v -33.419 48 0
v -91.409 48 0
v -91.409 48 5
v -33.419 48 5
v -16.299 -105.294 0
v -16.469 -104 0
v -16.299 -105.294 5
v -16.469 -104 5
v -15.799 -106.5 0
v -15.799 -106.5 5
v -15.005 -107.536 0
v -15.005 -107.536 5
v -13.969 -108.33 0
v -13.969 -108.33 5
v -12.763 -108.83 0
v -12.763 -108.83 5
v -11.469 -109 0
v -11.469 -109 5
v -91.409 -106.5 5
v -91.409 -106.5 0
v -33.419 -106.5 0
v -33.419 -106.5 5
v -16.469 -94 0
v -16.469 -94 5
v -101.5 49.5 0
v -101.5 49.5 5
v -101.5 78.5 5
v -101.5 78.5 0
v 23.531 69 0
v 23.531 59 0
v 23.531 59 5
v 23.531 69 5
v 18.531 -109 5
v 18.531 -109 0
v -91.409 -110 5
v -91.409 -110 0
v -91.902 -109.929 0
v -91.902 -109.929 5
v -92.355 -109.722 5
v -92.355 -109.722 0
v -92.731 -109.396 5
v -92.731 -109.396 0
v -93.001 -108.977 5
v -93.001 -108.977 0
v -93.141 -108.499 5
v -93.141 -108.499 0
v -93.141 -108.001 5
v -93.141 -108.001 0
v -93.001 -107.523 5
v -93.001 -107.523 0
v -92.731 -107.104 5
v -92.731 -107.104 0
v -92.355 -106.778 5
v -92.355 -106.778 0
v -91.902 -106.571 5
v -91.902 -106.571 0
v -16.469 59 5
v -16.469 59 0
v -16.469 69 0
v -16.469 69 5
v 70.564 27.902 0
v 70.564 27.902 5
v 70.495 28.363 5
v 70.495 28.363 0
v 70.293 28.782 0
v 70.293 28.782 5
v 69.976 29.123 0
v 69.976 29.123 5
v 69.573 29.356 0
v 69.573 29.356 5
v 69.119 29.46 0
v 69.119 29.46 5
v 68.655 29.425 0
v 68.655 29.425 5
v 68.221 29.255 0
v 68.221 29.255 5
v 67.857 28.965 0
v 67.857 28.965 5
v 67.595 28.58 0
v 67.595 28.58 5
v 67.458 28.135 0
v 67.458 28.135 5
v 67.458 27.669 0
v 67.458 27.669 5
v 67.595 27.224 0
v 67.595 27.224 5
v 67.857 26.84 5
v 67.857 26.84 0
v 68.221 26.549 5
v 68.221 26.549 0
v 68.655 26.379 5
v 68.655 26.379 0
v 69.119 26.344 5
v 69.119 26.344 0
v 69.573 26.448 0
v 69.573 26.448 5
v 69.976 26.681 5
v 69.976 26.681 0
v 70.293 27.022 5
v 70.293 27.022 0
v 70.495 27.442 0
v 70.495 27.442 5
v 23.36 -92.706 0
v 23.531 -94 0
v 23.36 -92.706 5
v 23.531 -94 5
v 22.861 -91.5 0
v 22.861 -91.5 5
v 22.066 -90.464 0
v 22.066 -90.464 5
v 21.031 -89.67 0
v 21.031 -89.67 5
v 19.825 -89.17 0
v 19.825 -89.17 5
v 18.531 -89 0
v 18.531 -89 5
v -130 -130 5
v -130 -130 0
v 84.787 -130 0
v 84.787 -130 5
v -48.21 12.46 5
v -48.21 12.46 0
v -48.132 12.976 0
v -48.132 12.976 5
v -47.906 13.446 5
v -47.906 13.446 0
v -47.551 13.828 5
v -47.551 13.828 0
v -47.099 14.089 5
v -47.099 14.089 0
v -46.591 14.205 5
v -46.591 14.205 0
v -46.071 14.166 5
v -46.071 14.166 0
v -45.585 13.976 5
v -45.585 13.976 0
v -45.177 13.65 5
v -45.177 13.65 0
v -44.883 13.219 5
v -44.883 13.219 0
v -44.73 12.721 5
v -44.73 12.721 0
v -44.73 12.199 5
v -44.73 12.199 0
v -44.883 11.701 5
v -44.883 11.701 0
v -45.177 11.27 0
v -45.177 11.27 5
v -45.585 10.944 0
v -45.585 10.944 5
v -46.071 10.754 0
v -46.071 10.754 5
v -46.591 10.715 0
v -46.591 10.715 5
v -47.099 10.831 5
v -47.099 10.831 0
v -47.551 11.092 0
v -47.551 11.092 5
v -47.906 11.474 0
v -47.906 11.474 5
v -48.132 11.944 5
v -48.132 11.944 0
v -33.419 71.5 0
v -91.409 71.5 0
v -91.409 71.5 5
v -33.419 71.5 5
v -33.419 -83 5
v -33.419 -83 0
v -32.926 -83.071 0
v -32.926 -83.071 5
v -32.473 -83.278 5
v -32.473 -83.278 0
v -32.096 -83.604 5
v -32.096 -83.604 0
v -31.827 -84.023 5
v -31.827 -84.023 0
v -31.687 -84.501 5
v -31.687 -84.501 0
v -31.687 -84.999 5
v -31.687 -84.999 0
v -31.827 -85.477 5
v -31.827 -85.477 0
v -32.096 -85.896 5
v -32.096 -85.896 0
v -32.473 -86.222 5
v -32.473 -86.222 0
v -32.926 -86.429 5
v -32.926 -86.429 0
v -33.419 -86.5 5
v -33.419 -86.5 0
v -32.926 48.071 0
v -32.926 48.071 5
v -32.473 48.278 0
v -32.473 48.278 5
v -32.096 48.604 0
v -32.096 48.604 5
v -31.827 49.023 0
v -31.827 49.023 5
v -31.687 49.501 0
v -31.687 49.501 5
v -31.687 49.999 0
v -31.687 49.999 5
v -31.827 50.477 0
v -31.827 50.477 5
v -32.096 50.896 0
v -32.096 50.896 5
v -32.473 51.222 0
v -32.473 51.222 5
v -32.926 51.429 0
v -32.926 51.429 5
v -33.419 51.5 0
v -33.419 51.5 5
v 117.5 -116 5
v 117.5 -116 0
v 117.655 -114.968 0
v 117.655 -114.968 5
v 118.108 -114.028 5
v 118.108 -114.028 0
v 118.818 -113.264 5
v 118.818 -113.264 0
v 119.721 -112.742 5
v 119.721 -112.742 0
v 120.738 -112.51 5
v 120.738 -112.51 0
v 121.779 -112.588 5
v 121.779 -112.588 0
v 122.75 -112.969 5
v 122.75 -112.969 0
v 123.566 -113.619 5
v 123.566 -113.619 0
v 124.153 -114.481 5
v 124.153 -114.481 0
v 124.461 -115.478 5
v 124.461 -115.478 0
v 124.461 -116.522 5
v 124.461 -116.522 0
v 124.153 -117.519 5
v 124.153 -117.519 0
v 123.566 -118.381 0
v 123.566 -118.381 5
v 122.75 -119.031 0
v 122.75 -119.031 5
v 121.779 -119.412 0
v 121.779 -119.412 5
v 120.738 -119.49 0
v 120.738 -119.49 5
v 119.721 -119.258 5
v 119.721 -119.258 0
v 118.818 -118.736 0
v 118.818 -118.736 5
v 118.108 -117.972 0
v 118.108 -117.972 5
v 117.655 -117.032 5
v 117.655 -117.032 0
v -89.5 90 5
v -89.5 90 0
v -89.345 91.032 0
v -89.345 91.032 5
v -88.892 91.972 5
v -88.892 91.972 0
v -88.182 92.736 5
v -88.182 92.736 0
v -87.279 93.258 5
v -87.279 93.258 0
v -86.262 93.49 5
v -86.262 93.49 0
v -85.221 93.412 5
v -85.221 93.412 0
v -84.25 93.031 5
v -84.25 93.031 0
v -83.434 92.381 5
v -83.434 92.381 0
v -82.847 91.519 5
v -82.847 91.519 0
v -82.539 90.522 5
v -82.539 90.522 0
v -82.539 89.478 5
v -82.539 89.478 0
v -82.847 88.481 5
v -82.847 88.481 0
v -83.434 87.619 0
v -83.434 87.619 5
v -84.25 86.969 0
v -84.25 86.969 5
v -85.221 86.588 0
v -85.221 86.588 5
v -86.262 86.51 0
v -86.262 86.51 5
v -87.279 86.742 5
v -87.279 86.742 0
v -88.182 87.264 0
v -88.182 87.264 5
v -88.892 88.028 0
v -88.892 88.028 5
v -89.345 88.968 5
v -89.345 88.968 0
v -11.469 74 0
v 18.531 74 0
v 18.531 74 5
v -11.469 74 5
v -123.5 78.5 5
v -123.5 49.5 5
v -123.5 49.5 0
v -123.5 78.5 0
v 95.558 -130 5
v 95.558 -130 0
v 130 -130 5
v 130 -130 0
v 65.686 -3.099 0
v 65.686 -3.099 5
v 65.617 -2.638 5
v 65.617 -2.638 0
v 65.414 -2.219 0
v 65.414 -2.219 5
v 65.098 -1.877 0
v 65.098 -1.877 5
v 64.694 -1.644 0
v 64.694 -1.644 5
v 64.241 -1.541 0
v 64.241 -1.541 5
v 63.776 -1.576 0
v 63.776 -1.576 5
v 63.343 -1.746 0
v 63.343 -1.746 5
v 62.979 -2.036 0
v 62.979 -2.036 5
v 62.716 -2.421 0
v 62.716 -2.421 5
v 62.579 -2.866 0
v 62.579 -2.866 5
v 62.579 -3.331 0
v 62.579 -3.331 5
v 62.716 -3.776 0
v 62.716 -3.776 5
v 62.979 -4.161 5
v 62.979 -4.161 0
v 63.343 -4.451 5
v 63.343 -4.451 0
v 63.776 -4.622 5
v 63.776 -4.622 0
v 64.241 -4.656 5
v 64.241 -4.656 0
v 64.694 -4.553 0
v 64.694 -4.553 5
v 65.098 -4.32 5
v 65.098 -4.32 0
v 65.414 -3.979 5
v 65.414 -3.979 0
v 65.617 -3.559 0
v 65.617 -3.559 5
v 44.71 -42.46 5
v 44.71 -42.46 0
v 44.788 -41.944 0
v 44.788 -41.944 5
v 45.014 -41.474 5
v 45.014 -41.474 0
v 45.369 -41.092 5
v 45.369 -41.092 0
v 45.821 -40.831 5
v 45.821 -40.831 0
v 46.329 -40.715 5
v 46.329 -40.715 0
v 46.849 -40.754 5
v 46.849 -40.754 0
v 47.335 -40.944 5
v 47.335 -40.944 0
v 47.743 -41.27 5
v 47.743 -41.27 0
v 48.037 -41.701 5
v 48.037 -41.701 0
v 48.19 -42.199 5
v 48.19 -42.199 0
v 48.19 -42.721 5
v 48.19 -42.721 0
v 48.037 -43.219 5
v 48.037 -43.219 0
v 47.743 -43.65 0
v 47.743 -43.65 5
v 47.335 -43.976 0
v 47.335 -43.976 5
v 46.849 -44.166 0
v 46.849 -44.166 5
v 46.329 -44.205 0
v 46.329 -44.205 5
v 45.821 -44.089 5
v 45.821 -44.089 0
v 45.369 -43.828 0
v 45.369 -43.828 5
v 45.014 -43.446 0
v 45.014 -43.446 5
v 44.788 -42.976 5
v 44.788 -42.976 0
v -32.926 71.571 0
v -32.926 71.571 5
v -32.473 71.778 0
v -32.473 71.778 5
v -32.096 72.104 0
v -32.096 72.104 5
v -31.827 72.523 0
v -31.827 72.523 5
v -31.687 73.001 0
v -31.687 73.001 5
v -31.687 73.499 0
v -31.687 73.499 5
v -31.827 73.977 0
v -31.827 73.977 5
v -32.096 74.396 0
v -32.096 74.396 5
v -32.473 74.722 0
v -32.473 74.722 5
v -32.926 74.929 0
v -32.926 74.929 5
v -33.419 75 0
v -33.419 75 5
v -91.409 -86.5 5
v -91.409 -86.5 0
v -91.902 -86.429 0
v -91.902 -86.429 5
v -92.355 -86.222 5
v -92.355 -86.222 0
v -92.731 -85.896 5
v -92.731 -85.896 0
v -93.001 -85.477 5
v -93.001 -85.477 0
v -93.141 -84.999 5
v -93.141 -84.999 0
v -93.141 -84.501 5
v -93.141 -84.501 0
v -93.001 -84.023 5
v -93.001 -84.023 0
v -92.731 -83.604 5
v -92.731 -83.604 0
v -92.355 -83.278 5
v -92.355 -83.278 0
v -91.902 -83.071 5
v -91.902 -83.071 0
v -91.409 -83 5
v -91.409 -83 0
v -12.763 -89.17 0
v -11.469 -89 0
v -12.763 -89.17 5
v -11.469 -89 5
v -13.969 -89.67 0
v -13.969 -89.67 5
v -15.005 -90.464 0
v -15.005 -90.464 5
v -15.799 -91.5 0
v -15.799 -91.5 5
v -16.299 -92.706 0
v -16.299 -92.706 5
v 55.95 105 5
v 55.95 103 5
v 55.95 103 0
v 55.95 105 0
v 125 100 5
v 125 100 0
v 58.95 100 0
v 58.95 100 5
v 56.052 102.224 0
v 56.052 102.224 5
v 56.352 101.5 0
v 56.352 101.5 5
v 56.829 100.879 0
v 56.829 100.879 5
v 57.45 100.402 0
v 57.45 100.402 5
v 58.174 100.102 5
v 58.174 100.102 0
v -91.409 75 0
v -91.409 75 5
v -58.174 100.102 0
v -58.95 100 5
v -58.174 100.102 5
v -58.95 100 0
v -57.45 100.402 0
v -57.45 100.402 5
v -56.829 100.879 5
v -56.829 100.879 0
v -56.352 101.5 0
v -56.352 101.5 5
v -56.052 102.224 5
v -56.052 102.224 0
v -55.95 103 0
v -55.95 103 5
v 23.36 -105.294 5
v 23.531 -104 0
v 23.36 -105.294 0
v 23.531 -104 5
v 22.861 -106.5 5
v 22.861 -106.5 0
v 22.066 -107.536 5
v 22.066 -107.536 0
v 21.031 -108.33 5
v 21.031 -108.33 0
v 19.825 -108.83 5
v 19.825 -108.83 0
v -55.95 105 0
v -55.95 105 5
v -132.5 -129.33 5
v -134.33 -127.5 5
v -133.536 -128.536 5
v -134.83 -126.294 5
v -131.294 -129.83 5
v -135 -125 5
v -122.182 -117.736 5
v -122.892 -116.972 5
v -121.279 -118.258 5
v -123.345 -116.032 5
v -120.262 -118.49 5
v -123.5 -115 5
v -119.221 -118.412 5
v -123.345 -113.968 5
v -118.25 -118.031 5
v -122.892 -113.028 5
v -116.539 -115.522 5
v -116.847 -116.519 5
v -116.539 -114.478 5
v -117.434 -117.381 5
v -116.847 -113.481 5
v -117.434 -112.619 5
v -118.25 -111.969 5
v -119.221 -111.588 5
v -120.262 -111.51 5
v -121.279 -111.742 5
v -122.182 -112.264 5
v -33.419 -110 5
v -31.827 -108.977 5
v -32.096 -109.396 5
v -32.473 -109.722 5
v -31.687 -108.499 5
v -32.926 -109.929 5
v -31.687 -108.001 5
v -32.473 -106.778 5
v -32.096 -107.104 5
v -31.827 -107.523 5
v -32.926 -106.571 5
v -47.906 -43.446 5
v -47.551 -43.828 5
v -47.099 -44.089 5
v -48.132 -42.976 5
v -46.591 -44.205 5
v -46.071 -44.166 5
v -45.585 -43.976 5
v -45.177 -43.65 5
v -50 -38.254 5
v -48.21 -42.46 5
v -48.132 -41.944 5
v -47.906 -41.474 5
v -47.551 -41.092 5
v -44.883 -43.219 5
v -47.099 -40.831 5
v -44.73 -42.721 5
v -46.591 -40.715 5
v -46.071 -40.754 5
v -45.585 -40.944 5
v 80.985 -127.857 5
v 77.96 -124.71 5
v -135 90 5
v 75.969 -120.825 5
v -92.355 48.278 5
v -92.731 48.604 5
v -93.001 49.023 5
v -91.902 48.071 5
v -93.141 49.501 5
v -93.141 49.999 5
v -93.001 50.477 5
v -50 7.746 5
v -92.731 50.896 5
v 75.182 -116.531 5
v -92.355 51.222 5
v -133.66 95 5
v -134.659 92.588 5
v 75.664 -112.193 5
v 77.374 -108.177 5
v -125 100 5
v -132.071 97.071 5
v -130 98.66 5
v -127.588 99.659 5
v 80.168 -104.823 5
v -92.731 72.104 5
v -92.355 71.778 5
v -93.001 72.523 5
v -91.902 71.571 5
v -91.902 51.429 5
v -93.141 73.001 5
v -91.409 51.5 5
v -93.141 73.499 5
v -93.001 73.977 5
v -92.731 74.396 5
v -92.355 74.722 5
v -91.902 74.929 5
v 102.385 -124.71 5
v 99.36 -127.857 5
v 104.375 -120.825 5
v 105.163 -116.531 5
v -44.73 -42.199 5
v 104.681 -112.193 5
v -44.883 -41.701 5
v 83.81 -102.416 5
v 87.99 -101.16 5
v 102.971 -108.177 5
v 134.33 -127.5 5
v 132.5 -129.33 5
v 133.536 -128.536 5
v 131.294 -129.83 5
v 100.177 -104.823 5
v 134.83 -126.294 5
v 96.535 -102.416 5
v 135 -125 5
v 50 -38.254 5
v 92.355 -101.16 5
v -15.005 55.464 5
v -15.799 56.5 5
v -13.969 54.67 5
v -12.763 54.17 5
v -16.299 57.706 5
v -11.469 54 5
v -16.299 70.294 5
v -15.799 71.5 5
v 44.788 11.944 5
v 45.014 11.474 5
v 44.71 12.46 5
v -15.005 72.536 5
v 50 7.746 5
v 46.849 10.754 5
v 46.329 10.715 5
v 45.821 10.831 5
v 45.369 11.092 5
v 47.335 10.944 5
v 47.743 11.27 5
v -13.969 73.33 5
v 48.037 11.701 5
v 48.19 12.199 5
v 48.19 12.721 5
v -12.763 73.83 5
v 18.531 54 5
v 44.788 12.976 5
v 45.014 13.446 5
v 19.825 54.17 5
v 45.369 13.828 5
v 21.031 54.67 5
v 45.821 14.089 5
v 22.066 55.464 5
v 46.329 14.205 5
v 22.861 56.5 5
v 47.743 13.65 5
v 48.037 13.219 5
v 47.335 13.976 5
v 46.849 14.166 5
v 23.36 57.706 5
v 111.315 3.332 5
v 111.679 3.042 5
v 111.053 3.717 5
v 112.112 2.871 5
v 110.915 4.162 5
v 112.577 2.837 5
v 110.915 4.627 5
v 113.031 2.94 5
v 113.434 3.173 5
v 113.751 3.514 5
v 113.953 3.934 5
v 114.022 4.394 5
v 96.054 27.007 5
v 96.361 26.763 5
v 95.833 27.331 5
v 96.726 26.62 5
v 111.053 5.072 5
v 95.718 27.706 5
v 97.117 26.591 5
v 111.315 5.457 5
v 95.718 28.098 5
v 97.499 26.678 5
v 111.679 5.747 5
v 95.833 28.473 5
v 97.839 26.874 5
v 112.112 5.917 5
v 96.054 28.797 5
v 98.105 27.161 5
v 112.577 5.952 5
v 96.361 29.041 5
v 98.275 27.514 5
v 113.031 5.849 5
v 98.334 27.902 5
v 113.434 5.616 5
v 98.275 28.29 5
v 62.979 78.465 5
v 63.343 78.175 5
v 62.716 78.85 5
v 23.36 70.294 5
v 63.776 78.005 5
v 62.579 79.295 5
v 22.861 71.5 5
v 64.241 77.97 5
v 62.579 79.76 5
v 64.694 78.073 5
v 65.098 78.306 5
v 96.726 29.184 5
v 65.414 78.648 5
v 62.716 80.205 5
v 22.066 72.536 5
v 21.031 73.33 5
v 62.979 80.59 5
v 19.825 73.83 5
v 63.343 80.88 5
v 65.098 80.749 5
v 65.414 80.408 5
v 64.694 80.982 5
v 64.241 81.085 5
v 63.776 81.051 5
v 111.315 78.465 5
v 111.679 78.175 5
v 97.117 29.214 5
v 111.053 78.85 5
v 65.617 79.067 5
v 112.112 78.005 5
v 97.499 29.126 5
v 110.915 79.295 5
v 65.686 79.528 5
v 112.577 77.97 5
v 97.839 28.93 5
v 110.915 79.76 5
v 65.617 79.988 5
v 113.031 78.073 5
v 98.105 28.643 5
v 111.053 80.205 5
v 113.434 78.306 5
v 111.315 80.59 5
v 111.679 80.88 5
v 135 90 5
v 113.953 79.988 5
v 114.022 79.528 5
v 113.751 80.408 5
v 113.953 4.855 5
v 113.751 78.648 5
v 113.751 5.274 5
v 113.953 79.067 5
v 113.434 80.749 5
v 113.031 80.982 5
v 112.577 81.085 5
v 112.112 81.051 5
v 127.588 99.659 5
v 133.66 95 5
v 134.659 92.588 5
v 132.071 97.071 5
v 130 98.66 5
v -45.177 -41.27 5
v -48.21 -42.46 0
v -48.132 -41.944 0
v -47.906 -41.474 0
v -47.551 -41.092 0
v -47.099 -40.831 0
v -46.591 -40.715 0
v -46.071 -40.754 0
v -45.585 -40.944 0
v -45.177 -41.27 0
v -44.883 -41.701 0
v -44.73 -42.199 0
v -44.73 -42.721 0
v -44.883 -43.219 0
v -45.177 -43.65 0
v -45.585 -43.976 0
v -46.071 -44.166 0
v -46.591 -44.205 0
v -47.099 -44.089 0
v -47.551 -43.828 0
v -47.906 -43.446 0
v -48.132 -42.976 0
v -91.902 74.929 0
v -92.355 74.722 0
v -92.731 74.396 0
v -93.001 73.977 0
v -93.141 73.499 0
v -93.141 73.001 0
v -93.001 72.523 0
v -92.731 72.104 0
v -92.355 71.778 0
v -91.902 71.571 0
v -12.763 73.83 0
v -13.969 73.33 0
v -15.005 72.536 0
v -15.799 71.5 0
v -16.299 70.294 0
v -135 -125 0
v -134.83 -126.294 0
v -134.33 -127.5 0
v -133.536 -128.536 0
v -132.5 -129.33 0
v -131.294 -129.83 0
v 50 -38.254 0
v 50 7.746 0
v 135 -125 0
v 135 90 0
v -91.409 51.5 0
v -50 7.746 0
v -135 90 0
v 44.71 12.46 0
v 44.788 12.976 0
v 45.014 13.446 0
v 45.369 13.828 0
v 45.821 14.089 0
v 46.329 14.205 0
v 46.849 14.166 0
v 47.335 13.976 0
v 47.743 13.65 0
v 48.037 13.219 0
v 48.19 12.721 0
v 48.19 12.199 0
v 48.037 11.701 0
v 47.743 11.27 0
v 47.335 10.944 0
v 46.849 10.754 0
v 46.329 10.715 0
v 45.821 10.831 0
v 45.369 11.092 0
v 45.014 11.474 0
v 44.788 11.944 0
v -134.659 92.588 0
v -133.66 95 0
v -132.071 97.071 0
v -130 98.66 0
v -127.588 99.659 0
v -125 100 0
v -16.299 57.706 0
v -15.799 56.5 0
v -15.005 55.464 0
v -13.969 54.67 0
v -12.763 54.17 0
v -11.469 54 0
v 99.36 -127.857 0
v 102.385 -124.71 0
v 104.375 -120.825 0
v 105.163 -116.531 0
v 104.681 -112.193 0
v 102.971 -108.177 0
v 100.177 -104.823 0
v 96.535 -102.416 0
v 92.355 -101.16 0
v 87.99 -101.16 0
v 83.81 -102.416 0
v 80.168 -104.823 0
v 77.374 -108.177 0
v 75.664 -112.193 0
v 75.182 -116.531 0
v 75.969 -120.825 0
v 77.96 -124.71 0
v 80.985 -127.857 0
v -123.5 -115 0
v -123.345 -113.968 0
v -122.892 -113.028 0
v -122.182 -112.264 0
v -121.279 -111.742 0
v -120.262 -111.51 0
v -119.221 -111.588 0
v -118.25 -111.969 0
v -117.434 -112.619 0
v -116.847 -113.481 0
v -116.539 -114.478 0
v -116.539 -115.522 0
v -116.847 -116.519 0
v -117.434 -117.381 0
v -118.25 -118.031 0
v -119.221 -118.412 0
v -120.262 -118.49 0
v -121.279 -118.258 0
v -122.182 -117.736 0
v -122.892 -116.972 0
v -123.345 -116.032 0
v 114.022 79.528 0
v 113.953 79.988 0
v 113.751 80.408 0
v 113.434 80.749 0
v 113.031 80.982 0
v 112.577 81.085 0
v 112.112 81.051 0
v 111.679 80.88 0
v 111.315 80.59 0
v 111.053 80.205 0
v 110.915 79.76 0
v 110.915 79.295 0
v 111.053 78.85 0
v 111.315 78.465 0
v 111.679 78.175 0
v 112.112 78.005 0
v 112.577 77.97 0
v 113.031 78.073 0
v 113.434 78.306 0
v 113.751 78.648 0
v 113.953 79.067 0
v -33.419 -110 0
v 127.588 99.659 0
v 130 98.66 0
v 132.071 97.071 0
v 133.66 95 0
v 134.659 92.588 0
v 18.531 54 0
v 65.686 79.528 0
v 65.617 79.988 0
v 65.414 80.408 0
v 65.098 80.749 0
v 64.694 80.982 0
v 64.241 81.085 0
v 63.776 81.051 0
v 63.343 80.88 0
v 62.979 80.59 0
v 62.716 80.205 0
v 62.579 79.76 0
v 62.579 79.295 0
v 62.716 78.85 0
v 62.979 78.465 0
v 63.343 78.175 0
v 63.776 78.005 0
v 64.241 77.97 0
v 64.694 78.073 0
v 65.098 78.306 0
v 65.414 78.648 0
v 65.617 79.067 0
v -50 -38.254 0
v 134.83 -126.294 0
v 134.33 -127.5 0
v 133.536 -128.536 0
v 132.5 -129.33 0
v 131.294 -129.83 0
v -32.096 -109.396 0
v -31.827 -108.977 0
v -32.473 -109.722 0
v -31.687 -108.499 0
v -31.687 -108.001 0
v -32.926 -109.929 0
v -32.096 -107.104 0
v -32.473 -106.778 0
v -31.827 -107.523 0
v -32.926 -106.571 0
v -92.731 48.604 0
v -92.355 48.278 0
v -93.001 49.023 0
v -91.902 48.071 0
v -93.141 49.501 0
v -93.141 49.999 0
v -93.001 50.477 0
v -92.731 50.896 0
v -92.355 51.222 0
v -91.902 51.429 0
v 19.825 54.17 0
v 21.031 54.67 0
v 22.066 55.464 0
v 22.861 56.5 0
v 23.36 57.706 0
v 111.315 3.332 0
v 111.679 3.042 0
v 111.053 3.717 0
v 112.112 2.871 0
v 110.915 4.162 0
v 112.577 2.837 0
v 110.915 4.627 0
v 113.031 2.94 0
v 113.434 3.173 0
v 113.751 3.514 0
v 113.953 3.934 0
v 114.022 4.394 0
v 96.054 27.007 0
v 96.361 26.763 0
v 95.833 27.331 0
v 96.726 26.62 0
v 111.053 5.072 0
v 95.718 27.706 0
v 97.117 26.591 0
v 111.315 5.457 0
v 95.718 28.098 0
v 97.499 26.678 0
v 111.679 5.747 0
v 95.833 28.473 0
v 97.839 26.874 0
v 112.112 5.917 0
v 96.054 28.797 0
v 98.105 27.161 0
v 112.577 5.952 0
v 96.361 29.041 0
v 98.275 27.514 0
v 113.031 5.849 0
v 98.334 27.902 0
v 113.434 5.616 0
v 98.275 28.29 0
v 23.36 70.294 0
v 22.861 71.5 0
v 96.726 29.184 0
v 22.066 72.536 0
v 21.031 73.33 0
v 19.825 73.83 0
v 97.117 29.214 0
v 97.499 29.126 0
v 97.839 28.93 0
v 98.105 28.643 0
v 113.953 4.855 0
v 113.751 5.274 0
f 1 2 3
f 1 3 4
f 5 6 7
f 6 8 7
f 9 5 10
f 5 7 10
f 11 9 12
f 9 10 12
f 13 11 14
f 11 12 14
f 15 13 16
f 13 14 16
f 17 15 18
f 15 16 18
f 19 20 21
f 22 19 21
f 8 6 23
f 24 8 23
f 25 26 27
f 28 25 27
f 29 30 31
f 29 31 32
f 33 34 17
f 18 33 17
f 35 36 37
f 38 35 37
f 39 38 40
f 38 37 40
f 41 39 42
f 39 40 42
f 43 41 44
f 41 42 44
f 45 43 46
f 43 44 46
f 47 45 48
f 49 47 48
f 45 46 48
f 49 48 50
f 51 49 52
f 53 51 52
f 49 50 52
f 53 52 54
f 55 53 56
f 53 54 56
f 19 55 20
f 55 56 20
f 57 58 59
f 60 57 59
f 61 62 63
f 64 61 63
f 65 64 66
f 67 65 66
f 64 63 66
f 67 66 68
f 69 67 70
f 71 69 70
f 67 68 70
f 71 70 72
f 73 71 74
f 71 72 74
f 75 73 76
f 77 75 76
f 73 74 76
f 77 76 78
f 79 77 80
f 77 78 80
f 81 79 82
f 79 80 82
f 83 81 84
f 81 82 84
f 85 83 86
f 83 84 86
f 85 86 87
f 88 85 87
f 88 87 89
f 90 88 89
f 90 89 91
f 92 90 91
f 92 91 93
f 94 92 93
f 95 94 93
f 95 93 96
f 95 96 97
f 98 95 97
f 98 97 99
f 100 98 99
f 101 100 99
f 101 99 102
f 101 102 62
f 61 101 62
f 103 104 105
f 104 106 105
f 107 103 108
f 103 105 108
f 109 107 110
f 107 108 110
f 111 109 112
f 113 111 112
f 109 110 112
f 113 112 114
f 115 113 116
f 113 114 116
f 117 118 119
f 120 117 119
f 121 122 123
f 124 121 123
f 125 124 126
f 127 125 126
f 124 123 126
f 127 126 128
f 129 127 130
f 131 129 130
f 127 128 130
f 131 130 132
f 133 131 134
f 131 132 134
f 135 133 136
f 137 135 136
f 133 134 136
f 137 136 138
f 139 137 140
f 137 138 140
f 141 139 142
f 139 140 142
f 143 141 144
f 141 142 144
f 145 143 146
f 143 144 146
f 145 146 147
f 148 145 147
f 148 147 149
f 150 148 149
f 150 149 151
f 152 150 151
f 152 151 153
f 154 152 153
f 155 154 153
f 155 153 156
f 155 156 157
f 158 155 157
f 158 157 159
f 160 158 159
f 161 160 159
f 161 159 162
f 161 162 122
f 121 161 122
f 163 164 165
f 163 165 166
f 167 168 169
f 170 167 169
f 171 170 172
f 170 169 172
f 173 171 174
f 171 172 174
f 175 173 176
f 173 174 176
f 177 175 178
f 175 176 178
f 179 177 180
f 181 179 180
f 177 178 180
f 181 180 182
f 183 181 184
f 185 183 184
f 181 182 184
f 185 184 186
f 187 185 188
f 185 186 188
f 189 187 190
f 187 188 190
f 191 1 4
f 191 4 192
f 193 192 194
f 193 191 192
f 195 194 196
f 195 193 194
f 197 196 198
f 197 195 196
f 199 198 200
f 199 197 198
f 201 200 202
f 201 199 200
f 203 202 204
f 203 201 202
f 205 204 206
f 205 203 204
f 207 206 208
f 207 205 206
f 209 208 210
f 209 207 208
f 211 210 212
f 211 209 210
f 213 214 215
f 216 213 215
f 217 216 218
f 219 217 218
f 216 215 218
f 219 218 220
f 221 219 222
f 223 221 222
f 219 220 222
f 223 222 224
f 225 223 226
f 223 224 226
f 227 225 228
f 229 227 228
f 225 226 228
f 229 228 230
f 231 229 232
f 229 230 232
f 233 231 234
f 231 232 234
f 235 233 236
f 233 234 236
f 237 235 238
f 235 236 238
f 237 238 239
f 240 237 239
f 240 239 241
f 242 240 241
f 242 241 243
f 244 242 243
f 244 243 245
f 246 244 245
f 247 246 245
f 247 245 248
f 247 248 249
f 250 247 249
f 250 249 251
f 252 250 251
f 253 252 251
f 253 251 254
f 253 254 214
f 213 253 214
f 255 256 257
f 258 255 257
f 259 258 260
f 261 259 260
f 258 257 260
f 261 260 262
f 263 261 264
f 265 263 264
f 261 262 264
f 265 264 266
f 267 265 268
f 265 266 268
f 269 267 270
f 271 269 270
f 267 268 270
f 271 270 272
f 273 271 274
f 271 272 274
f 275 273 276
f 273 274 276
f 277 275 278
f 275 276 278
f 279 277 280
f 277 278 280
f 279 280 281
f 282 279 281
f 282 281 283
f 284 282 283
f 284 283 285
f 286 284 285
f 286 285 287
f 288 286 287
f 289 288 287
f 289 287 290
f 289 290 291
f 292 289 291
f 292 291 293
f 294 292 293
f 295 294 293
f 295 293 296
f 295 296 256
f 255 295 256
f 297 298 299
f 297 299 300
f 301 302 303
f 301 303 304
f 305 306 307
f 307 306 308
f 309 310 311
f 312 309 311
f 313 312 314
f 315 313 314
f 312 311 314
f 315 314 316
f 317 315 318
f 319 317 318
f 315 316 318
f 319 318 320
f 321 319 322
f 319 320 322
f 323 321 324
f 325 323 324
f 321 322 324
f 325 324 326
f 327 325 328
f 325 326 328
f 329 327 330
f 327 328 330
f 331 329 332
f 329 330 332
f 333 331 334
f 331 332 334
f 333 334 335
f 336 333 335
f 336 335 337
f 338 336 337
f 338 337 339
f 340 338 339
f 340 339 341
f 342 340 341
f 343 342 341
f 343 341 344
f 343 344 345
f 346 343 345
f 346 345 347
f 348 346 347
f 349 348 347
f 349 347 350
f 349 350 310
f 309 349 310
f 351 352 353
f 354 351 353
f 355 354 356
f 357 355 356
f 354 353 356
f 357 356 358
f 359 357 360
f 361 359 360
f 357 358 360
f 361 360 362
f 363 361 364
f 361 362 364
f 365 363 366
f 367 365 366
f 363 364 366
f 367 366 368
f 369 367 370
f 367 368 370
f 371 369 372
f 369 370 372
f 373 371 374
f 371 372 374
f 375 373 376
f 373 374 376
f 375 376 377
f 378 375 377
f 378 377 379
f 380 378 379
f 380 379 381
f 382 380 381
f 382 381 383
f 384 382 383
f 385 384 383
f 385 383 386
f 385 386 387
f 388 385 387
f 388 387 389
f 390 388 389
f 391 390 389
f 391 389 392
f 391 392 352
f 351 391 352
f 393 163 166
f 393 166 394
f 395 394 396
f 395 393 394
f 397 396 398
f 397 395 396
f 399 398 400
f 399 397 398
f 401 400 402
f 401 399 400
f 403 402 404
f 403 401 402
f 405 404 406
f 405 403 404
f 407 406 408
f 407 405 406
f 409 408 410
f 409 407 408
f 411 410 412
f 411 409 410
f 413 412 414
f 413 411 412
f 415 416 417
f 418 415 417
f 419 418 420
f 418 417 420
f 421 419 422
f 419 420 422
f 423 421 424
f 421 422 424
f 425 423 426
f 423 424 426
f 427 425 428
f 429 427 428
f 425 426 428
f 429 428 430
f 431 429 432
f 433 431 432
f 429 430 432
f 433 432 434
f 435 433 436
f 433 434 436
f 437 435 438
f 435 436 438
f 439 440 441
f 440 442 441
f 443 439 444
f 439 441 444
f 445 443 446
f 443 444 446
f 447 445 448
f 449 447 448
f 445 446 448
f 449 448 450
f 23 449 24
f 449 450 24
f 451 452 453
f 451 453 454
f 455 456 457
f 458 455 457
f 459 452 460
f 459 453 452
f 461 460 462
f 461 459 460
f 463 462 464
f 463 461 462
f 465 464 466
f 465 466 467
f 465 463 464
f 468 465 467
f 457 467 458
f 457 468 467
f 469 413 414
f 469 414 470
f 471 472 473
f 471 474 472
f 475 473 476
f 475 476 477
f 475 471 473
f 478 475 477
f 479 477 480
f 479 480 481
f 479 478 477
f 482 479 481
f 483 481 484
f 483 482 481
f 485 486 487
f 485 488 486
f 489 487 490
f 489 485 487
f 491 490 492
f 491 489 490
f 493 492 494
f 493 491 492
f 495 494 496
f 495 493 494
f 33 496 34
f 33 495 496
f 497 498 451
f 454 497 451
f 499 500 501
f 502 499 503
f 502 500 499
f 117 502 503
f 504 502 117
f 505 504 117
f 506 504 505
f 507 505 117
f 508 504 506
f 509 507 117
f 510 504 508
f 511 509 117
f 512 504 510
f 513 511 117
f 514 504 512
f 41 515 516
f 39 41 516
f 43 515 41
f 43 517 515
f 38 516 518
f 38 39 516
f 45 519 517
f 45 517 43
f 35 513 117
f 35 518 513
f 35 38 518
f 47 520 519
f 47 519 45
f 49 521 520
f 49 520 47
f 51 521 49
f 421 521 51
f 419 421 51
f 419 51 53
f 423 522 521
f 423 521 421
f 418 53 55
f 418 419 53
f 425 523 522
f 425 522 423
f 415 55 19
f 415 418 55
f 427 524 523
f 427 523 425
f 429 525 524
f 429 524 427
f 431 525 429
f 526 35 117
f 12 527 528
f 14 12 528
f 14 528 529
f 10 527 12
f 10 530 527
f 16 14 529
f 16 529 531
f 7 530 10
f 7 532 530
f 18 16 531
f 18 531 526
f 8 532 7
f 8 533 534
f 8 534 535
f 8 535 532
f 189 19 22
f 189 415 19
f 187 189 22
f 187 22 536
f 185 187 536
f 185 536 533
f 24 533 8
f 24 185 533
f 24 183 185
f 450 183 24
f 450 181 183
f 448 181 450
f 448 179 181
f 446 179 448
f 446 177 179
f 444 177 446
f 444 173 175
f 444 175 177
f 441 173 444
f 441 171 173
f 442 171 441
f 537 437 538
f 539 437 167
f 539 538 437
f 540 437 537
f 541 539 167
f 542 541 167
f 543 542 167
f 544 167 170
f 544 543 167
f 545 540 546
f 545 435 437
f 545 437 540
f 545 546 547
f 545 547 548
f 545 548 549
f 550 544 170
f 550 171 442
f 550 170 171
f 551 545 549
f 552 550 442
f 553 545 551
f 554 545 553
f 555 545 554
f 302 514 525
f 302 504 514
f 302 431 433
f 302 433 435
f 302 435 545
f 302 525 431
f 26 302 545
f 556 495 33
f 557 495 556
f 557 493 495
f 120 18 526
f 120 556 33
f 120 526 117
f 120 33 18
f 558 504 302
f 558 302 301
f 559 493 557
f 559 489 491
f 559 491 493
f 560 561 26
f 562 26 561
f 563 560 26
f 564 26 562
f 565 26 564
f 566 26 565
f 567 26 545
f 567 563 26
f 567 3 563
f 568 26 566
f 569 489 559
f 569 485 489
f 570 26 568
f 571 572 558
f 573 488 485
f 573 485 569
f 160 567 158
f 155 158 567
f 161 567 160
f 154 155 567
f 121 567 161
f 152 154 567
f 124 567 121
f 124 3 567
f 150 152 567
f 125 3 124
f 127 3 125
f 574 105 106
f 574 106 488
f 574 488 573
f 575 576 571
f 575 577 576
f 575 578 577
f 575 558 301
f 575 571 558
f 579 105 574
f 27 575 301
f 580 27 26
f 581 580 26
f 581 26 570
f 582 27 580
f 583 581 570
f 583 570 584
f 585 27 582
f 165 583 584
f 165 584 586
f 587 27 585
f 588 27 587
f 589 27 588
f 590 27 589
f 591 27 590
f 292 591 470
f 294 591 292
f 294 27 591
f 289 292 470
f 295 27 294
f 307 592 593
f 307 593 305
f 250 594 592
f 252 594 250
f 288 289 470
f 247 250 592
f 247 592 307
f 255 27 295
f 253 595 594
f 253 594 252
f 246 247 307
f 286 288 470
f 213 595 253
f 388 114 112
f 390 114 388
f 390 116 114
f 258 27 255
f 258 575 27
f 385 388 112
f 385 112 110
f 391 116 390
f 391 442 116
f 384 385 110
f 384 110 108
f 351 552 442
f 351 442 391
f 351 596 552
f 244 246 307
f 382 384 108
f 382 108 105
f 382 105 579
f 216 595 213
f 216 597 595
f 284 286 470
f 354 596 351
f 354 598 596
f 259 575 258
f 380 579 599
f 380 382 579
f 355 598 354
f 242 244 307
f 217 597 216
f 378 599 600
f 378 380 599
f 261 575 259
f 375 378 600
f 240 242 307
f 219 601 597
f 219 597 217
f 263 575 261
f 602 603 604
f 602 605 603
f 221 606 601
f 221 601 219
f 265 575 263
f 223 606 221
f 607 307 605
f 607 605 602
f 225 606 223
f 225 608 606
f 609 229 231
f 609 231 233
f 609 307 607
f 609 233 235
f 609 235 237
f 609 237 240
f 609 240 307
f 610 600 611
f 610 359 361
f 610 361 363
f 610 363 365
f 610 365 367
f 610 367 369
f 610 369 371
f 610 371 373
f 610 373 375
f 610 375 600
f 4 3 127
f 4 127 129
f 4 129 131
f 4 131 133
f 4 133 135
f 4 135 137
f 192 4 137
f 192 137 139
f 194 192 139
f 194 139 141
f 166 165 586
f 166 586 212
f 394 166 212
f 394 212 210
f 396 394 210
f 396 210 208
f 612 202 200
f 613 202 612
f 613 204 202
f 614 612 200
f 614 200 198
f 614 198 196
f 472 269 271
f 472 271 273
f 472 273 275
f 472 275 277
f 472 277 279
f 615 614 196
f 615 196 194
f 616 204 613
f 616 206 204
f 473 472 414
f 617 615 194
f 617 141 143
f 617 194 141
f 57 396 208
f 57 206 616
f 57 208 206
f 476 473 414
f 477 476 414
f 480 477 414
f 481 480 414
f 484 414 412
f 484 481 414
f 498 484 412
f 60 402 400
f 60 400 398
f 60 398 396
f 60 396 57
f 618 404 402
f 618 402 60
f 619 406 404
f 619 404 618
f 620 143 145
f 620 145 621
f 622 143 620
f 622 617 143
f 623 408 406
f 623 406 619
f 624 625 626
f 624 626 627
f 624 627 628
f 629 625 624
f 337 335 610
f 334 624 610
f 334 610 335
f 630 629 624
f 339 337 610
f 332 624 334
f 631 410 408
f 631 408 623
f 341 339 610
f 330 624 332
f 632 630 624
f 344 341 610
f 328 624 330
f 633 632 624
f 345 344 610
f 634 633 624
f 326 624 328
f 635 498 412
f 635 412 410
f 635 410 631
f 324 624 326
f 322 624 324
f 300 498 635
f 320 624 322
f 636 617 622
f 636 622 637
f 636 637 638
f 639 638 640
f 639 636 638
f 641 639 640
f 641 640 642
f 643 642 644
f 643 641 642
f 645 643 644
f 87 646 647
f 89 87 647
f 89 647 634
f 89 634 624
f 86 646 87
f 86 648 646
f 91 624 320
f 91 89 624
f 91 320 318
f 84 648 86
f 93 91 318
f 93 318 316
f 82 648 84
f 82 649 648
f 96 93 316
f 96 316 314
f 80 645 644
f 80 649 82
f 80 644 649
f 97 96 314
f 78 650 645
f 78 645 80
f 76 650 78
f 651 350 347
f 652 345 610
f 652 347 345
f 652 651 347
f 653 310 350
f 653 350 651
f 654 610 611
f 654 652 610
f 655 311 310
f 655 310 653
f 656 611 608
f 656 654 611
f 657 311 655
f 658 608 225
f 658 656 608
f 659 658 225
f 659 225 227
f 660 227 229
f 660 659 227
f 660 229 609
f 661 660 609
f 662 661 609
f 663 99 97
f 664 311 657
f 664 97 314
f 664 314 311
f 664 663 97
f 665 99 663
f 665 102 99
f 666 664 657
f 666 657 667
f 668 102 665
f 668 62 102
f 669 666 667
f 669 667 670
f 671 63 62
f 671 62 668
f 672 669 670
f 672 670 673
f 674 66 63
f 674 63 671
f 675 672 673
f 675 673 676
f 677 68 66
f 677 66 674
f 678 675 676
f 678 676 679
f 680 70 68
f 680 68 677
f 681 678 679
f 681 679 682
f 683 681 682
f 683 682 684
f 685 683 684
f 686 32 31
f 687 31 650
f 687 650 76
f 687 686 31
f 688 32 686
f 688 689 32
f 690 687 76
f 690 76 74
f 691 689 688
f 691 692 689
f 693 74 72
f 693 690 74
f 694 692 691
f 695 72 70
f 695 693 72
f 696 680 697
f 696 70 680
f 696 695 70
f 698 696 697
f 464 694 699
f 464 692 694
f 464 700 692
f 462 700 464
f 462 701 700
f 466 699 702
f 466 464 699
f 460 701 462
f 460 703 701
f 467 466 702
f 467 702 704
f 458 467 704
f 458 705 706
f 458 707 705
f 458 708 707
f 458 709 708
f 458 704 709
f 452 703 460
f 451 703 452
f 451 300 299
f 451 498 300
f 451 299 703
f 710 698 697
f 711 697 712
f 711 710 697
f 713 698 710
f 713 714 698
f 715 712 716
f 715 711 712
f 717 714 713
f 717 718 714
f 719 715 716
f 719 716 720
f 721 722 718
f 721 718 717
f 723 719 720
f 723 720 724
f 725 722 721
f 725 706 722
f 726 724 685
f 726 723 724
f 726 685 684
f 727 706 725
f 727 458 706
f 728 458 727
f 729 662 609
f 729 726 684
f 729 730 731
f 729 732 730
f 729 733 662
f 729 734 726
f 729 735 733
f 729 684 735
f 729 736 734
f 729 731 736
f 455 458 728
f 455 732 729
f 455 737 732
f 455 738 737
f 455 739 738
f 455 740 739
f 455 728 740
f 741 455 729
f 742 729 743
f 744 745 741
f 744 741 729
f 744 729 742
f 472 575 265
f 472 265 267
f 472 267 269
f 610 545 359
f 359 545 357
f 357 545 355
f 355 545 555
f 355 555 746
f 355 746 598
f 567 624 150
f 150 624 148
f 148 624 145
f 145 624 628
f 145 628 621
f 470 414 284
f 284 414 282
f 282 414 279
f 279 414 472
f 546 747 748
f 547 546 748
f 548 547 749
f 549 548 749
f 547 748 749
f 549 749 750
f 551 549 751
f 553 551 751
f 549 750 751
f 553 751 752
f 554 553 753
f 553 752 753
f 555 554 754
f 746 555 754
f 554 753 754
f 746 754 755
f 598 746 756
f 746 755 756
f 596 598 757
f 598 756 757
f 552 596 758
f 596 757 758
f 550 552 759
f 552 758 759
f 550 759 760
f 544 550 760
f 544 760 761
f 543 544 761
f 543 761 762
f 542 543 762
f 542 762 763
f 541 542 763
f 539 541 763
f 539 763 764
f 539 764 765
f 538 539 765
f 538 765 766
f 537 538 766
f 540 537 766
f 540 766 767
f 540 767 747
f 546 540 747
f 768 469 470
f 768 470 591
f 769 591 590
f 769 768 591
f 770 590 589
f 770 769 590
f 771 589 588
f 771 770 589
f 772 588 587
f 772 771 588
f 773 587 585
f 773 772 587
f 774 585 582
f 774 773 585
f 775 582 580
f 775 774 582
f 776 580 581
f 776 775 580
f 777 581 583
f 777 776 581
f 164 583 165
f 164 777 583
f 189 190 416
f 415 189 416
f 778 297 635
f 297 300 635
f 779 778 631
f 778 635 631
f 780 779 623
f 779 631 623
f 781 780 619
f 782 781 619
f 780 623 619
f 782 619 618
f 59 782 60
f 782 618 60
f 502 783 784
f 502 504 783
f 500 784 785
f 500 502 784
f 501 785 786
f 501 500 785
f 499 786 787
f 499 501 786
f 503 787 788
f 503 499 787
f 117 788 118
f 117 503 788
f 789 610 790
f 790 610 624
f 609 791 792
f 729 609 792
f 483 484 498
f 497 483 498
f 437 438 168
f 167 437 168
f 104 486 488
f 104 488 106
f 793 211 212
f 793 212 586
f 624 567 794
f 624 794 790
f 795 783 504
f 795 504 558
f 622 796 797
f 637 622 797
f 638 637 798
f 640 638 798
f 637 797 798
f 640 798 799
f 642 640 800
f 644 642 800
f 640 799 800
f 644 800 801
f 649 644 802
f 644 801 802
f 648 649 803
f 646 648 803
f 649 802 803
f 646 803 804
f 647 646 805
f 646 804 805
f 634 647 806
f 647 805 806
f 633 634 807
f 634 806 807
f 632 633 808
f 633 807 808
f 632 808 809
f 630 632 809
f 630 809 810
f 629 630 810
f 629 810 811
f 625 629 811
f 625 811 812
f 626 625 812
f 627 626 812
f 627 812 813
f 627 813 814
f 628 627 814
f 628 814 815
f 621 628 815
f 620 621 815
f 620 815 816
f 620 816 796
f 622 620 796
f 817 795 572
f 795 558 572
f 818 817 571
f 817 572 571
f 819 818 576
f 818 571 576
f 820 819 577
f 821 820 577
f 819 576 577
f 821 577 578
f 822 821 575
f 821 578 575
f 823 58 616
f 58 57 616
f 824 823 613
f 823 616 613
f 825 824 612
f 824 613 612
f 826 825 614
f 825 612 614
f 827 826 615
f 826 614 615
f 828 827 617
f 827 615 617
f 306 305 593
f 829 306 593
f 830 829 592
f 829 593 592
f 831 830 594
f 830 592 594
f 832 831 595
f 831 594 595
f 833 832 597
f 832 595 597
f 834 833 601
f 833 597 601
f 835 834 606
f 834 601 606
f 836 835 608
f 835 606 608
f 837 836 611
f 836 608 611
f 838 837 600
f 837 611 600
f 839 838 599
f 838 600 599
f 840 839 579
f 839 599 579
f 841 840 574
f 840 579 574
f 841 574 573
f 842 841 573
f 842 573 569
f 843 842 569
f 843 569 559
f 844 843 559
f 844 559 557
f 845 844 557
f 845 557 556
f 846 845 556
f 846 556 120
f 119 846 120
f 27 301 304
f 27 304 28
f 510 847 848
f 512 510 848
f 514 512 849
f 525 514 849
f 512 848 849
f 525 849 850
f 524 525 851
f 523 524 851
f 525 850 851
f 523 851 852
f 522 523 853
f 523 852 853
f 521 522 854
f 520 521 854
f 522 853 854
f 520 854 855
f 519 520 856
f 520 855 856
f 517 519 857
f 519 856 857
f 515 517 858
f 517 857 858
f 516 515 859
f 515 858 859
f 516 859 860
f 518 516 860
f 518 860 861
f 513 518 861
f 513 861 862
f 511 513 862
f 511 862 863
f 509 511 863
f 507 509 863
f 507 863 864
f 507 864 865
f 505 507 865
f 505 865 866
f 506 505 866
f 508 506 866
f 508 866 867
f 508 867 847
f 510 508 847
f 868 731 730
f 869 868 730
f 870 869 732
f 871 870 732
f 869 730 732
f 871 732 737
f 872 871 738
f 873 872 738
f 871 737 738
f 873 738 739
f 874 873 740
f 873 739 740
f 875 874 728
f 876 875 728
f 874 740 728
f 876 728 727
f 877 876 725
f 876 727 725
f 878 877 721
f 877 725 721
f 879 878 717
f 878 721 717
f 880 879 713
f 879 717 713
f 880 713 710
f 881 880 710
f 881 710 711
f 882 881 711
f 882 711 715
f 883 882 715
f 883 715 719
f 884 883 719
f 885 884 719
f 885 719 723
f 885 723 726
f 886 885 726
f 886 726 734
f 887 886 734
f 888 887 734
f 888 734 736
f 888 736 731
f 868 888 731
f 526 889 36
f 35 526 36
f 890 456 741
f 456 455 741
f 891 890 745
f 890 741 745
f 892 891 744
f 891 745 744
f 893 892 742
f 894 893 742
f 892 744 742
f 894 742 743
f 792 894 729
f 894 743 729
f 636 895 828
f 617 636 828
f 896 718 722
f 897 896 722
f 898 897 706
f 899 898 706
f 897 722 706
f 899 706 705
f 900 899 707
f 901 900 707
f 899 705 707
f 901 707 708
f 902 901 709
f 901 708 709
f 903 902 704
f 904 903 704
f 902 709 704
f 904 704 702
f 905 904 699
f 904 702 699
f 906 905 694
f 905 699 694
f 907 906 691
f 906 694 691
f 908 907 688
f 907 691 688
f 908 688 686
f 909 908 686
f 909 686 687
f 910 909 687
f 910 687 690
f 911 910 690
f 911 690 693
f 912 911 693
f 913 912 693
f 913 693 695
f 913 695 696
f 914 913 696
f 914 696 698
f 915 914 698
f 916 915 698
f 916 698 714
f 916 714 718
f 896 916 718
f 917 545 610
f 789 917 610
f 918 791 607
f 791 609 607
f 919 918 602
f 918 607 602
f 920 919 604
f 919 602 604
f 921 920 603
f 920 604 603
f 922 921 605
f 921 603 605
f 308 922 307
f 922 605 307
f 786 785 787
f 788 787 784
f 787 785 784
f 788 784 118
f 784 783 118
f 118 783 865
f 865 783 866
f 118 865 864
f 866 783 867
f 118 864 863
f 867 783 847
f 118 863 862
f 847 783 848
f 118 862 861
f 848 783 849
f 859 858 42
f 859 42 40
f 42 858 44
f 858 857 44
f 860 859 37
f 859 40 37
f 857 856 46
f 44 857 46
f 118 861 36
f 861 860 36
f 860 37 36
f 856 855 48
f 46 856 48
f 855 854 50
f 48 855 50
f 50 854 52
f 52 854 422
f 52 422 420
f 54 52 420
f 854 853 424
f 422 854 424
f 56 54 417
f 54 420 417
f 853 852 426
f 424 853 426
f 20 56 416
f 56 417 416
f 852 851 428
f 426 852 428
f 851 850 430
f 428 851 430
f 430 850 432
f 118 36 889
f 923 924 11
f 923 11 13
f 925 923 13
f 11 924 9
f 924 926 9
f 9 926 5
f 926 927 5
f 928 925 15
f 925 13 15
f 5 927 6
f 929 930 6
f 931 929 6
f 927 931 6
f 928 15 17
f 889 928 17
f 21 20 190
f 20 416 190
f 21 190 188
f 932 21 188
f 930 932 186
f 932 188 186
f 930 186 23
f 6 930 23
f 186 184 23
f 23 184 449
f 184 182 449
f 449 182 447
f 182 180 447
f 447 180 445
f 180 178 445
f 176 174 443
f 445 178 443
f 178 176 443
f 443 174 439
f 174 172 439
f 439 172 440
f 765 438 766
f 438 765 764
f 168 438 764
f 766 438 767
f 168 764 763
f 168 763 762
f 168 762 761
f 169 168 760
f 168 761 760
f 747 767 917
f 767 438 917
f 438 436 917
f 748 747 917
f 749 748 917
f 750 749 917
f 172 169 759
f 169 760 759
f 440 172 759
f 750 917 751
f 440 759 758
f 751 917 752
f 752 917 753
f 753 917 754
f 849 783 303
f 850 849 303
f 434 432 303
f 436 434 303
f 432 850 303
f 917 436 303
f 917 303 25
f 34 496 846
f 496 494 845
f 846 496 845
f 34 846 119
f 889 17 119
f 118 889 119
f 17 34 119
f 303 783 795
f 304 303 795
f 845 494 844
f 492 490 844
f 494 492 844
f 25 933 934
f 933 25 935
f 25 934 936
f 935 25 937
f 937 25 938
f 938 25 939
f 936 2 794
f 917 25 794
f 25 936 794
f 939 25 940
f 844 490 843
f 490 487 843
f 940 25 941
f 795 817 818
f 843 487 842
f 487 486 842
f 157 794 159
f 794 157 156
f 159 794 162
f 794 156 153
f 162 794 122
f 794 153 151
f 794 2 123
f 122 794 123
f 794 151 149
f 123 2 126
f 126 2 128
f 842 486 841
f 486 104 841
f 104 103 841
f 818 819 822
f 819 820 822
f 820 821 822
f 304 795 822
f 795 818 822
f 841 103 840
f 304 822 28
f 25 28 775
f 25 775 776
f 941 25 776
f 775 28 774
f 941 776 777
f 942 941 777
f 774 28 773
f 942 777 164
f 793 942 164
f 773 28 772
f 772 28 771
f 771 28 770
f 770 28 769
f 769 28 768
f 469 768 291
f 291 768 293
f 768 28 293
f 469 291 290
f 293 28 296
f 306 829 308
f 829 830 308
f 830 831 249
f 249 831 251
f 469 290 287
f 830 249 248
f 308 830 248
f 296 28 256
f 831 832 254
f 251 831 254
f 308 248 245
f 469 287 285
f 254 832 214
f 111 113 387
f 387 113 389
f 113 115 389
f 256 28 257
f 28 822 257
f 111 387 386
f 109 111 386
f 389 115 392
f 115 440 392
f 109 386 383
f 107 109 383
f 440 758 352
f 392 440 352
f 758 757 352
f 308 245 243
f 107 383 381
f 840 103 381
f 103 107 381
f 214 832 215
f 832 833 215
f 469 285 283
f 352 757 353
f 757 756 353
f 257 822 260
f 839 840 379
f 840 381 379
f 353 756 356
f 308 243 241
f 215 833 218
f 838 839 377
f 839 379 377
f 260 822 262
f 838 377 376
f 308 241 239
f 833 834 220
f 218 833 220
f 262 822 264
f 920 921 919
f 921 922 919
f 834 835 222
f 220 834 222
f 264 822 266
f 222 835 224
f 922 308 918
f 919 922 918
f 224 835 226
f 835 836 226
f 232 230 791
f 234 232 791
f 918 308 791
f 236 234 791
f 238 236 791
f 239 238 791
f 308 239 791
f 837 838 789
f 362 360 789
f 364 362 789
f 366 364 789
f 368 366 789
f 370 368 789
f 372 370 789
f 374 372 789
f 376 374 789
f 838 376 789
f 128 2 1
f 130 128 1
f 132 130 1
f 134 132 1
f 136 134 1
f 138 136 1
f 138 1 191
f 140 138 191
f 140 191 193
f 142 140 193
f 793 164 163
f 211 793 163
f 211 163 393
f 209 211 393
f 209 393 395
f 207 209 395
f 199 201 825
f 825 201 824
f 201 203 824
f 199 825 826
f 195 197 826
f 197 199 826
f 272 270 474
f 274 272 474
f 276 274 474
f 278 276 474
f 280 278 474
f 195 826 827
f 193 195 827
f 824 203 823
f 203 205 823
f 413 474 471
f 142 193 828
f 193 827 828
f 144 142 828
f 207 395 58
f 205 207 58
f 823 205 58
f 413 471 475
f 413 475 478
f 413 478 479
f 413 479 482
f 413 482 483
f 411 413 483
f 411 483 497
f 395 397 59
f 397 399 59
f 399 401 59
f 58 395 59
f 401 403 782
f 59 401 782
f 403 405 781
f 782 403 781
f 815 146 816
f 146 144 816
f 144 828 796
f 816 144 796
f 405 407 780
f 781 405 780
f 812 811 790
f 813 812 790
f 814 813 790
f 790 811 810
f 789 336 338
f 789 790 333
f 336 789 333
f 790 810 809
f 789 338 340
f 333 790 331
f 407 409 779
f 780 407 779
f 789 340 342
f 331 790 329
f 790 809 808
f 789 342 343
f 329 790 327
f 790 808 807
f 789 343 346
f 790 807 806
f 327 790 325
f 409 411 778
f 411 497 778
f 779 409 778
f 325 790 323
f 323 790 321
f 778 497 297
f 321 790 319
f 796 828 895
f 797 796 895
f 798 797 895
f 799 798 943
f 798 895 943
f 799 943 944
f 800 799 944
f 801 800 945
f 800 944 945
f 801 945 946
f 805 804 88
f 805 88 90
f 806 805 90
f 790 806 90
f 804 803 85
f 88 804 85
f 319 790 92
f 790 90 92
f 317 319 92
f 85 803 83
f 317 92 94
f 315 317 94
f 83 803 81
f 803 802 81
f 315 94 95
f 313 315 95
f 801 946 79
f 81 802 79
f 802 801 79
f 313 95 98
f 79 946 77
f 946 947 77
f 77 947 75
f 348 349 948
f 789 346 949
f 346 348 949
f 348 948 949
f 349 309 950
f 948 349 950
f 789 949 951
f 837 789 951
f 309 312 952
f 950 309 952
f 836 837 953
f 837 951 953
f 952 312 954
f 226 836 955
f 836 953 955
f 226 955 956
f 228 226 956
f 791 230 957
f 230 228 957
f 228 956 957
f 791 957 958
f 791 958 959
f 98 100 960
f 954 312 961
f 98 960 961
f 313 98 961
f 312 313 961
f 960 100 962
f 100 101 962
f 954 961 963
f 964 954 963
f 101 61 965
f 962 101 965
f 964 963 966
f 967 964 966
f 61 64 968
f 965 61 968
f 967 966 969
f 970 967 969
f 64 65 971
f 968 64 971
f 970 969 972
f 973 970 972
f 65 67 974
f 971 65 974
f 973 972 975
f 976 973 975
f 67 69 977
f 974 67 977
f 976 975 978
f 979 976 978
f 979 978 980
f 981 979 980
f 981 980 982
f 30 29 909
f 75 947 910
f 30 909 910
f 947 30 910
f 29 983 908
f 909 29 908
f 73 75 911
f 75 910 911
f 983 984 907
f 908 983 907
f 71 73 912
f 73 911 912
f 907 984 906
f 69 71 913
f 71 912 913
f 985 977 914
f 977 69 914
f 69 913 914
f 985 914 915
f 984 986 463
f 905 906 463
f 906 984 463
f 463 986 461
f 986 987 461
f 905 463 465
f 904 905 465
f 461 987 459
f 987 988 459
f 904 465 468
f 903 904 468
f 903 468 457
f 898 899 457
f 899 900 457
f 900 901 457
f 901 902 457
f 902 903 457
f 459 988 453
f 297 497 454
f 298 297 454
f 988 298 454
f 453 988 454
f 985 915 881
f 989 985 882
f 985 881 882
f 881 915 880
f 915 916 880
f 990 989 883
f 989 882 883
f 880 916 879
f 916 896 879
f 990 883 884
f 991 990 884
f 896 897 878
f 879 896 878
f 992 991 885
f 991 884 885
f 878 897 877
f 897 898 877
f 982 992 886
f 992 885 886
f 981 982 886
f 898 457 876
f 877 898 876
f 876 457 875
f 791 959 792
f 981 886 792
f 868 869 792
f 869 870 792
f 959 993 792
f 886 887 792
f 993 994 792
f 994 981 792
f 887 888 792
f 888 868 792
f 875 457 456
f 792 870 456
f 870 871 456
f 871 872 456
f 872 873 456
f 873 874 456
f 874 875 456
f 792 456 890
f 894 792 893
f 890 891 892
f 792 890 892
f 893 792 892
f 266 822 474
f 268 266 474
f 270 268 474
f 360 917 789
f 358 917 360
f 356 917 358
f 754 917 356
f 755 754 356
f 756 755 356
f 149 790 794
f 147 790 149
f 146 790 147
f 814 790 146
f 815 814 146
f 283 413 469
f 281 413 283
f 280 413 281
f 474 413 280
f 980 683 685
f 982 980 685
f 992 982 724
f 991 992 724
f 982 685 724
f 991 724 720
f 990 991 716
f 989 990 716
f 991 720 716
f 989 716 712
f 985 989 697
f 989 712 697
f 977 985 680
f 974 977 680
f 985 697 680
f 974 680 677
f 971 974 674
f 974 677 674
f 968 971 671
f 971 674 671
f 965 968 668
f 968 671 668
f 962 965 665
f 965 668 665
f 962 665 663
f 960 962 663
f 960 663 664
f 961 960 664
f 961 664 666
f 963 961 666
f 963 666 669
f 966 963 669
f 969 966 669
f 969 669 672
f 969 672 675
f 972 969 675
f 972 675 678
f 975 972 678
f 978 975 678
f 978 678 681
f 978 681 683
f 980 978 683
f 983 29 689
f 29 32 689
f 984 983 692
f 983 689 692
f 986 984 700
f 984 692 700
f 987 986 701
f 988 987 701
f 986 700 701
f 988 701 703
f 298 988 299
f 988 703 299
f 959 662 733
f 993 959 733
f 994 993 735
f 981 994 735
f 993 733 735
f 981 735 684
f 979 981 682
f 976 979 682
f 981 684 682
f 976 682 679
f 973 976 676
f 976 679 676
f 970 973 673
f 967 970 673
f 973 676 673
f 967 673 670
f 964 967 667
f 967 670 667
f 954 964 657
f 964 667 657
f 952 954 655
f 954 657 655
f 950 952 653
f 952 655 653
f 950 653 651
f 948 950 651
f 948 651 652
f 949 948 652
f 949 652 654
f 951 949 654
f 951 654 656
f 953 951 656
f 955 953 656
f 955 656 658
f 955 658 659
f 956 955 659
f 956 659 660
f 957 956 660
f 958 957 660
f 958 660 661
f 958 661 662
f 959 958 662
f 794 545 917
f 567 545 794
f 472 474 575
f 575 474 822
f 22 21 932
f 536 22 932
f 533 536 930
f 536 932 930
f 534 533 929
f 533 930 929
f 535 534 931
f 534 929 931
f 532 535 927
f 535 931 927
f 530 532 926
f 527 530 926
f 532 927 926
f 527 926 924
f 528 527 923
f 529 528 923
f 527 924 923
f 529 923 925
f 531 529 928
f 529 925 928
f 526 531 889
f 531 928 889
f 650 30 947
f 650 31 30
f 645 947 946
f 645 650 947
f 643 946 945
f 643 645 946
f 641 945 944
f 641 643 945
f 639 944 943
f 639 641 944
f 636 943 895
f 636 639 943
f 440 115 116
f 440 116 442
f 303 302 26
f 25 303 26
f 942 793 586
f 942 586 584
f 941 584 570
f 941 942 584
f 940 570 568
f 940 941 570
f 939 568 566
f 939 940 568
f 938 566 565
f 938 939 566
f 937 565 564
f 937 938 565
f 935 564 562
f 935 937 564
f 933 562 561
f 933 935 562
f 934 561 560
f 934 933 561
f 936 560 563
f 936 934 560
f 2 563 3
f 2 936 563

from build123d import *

# Parameters (mm, degrees)
SKETCH1_W           = 270
SKETCH1_H           = 260
BOSS_EXTRUDE1_DEPTH = 5
SKETCH2_R           = 3.5
CUT_EXTRUDE1_DEPTH  = 188.483332593
SKETCH3_R           = 15
CUT_EXTRUDE2_DEPTH  = 188.483332593
FILLET1_R           = 5
CUT_EXTRUDE3_DEPTH  = 188.483332593
SKETCH6_W           = 111.9
SKETCH6_H           = 5
BOSS_EXTRUDE2_DEPTH = 5
FILLET2_R           = 10
SKETCH9_W           = 22
SKETCH9_H           = 29
CUT_EXTRUDE5_DEPTH  = 188.483332593
SKETCH10_R          = 1.75
CUT_EXTRUDE6_DEPTH  = 188.483332593
SKETCH11_W          = 100
SKETCH11_H          = 46
CUT_EXTRUDE7_DEPTH  = 188.483332593
SKETCH12_R          = 1.5621
SKETCH12_R_2        = 1.315256363
CUT_EXTRUDE8_DEPTH  = 188.483332593
SKETCH13_W          = 40
SKETCH13_H          = 20
CUT_EXTRUDE9_DEPTH  = 188.483332593
FILLET3_R           = 3
FILLET6_R           = 5
FILLET7_R           = 5


with BuildPart() as part:
    # Sketch1 → Boss-Extrude1 (new body)
    with BuildSketch(Plane.XY):
        Rectangle(SKETCH1_W, SKETCH1_H)
    extrude(amount=BOSS_EXTRUDE1_DEPTH)

    # Sketch2 → Cut-Extrude1 (cut, through all)
    with BuildSketch(Plane(origin=(0, 0, 0), x_dir=(-1, 0, 0), z_dir=(0, 0, -1))):
        with Locations((120, -115)):
            Circle(SKETCH2_R)
        with Locations((86, 90)):
            Circle(SKETCH2_R)
        with Locations((-121, -116)):
            Circle(SKETCH2_R)
    extrude(amount=-CUT_EXTRUDE1_DEPTH, mode=Mode.SUBTRACT)

    # Sketch3 → Cut-Extrude2 (cut, through all)
    with BuildSketch(Plane.XY.offset(5)):
        with Locations((90.172367877, -116)):
            Circle(SKETCH3_R)
    extrude(amount=-CUT_EXTRUDE2_DEPTH, mode=Mode.SUBTRACT)

    # Fillet1
    fillet1_edges = [part.edges().sort_by_distance(p)[0] for p in [
        (135, -130, 2.5),
        (-135, -130, 2.5),
        (-135, 130, 2.5),
        (135, 130, 2.5),
    ]]
    fillet(fillet1_edges, radius=FILLET1_R)

    # Sketch4 → Cut-Extrude3 (cut, through all)
    with BuildSketch(Plane(origin=(0, 0, 0), x_dir=(-1, 0, 0), z_dir=(0, 0, -1))):
        with BuildLine():
            Line((95.6, 100), (135, 100))
            Line((135, 100), (135, 125))
            ThreePointArc((135, 125), (133.535533906, 128.535533906), (130, 130))
            Line((130, 130), (-130, 130))
            ThreePointArc((-130, 130), (-133.535533906, 128.535533906), (-135, 125))
            Line((-135, 125), (-135, 100))
            Line((-135, 100), (90.2, 100))
            Line((90.2, 100), (95.6, 100))
        make_face()
    extrude(amount=-CUT_EXTRUDE3_DEPTH, mode=Mode.SUBTRACT)

    # Sketch6 → Boss-Extrude2 (add)
    with BuildSketch(Plane.XY.offset(5)):
        with Locations((0, 102.5)):
            Rectangle(SKETCH6_W, SKETCH6_H)
    extrude(amount=-BOSS_EXTRUDE2_DEPTH)

    # Fillet2
    fillet2_edges = [part.edges().sort_by_distance(p)[0] for p in [
        (-135, 100, 2.5),
        (135, 100, 2.5),
    ]]
    fillet(fillet2_edges, radius=FILLET2_R)

    # Sketch9 → Cut-Extrude5 (cut, through all)
    with BuildSketch(Plane.XY.offset(5)):
        with Locations((-112.5, 64)):
            Rectangle(SKETCH9_W, SKETCH9_H)
    extrude(amount=-CUT_EXTRUDE5_DEPTH, mode=Mode.SUBTRACT)

    # Sketch10 → Cut-Extrude6 (cut, through all)
    with BuildSketch(Plane(origin=(0, 0, 0), x_dir=(-1, 0, 0), z_dir=(0, 0, -1))):
        with Locations((-46.46, 12.46)):
            Circle(SKETCH10_R)
        with Locations((46.46, 12.46)):
            Circle(SKETCH10_R)
        with Locations((-46.46, -42.46)):
            Circle(SKETCH10_R)
        with Locations((46.46, -42.46)):
            Circle(SKETCH10_R)
    extrude(amount=-CUT_EXTRUDE6_DEPTH, mode=Mode.SUBTRACT)

    # Sketch11 → Cut-Extrude7 (cut, through all)
    with BuildSketch(Plane.XY.offset(5)):
        with Locations((0, -15.253546855)):
            Rectangle(SKETCH11_W, SKETCH11_H)
    extrude(amount=-CUT_EXTRUDE7_DEPTH, mode=Mode.SUBTRACT)

    # Sketch12 → Cut-Extrude8 (cut, through all)
    with BuildSketch(Plane.XY.offset(5)):
        with Locations((112.46, 4.3944)):
            Circle(SKETCH12_R)
        with Locations((64.1238, -3.0986)):
            Circle(SKETCH12_R)
        with Locations((69.002292766, 27.9021)):
            Circle(SKETCH12_R)
        with Locations((97.018492766, 27.9021)):
            Circle(SKETCH12_R_2)
        with Locations((112.46, 79.5276)):
            Circle(SKETCH12_R)
        with Locations((64.1238, 79.5276)):
            Circle(SKETCH12_R)
    extrude(amount=-CUT_EXTRUDE8_DEPTH, mode=Mode.SUBTRACT)

    # Sketch13 → Cut-Extrude9 (cut, through all)
    with BuildSketch(Plane(origin=(0, 0, 0), x_dir=(-1, 0, 0), z_dir=(0, 0, -1))):
        with BuildLine():
            Line((33.41898198, 75), (91.408776107, 75))
            ThreePointArc((91.408776107, 75), (93.158776107, 73.25), (91.408776107, 71.5))
            Line((91.408776107, 71.5), (33.41898198, 71.5))
            ThreePointArc((33.41898198, 71.5), (31.66898198, 73.25), (33.41898198, 75))
        make_face()
        with BuildLine():
            Line((33.41898198, 51.5), (91.408776107, 51.5))
            ThreePointArc((91.408776107, 51.5), (93.158776107, 49.75), (91.408776107, 48))
            Line((91.408776107, 48), (33.41898198, 48))
            ThreePointArc((33.41898198, 48), (31.66898198, 49.75), (33.41898198, 51.5))
        make_face()
        with Locations((-3.530791298, 64)):
            Rectangle(SKETCH13_W, SKETCH13_H)
        with Locations((-3.530791298, -99)):
            Rectangle(SKETCH13_W, SKETCH13_H)
        with BuildLine():
            Line((33.41898198, -86.5), (91.408776107, -86.5))
            ThreePointArc((91.408776107, -86.5), (93.158776107, -84.75), (91.408776107, -83))
            Line((91.408776107, -83), (33.41898198, -83))
            ThreePointArc((33.41898198, -83), (31.66898198, -84.75), (33.41898198, -86.5))
        make_face()
        with BuildLine():
            Line((33.41898198, -110), (91.408776107, -110))
            ThreePointArc((91.408776107, -110), (93.158776107, -108.25), (91.408776107, -106.5))
            Line((91.408776107, -106.5), (33.41898198, -106.5))
            ThreePointArc((33.41898198, -106.5), (31.66898198, -108.25), (33.41898198, -110))
        make_face()
    extrude(amount=-CUT_EXTRUDE9_DEPTH, mode=Mode.SUBTRACT)

    # Fillet3
    fillet3_edges = [part.edges().sort_by_distance(p)[0] for p in [
        (-55.95, 100, 2.5),
        (55.95, 100, 2.5),
    ]]
    fillet(fillet3_edges, radius=FILLET3_R)

    # Fillet6
    fillet6_edges = [part.edges().sort_by_distance(p)[0] for p in [
        (-16.469208702, 74, 2.5),
        (-16.469208702, 54, 2.5),
        (23.530791298, 54, 2.5),
        (23.530791298, 74, 2.5),
    ]]
    fillet(fillet6_edges, radius=FILLET6_R)

    # Fillet7
    fillet7_edges = [part.edges().sort_by_distance(p)[0] for p in [
        (23.530791298, -109, 2.5),
        (23.530791298, -89, 2.5),
        (-16.469208702, -89, 2.5),
        (-16.469208702, -109, 2.5),
    ]]
    fillet(fillet7_edges, radius=FILLET7_R)


solid = part.part
